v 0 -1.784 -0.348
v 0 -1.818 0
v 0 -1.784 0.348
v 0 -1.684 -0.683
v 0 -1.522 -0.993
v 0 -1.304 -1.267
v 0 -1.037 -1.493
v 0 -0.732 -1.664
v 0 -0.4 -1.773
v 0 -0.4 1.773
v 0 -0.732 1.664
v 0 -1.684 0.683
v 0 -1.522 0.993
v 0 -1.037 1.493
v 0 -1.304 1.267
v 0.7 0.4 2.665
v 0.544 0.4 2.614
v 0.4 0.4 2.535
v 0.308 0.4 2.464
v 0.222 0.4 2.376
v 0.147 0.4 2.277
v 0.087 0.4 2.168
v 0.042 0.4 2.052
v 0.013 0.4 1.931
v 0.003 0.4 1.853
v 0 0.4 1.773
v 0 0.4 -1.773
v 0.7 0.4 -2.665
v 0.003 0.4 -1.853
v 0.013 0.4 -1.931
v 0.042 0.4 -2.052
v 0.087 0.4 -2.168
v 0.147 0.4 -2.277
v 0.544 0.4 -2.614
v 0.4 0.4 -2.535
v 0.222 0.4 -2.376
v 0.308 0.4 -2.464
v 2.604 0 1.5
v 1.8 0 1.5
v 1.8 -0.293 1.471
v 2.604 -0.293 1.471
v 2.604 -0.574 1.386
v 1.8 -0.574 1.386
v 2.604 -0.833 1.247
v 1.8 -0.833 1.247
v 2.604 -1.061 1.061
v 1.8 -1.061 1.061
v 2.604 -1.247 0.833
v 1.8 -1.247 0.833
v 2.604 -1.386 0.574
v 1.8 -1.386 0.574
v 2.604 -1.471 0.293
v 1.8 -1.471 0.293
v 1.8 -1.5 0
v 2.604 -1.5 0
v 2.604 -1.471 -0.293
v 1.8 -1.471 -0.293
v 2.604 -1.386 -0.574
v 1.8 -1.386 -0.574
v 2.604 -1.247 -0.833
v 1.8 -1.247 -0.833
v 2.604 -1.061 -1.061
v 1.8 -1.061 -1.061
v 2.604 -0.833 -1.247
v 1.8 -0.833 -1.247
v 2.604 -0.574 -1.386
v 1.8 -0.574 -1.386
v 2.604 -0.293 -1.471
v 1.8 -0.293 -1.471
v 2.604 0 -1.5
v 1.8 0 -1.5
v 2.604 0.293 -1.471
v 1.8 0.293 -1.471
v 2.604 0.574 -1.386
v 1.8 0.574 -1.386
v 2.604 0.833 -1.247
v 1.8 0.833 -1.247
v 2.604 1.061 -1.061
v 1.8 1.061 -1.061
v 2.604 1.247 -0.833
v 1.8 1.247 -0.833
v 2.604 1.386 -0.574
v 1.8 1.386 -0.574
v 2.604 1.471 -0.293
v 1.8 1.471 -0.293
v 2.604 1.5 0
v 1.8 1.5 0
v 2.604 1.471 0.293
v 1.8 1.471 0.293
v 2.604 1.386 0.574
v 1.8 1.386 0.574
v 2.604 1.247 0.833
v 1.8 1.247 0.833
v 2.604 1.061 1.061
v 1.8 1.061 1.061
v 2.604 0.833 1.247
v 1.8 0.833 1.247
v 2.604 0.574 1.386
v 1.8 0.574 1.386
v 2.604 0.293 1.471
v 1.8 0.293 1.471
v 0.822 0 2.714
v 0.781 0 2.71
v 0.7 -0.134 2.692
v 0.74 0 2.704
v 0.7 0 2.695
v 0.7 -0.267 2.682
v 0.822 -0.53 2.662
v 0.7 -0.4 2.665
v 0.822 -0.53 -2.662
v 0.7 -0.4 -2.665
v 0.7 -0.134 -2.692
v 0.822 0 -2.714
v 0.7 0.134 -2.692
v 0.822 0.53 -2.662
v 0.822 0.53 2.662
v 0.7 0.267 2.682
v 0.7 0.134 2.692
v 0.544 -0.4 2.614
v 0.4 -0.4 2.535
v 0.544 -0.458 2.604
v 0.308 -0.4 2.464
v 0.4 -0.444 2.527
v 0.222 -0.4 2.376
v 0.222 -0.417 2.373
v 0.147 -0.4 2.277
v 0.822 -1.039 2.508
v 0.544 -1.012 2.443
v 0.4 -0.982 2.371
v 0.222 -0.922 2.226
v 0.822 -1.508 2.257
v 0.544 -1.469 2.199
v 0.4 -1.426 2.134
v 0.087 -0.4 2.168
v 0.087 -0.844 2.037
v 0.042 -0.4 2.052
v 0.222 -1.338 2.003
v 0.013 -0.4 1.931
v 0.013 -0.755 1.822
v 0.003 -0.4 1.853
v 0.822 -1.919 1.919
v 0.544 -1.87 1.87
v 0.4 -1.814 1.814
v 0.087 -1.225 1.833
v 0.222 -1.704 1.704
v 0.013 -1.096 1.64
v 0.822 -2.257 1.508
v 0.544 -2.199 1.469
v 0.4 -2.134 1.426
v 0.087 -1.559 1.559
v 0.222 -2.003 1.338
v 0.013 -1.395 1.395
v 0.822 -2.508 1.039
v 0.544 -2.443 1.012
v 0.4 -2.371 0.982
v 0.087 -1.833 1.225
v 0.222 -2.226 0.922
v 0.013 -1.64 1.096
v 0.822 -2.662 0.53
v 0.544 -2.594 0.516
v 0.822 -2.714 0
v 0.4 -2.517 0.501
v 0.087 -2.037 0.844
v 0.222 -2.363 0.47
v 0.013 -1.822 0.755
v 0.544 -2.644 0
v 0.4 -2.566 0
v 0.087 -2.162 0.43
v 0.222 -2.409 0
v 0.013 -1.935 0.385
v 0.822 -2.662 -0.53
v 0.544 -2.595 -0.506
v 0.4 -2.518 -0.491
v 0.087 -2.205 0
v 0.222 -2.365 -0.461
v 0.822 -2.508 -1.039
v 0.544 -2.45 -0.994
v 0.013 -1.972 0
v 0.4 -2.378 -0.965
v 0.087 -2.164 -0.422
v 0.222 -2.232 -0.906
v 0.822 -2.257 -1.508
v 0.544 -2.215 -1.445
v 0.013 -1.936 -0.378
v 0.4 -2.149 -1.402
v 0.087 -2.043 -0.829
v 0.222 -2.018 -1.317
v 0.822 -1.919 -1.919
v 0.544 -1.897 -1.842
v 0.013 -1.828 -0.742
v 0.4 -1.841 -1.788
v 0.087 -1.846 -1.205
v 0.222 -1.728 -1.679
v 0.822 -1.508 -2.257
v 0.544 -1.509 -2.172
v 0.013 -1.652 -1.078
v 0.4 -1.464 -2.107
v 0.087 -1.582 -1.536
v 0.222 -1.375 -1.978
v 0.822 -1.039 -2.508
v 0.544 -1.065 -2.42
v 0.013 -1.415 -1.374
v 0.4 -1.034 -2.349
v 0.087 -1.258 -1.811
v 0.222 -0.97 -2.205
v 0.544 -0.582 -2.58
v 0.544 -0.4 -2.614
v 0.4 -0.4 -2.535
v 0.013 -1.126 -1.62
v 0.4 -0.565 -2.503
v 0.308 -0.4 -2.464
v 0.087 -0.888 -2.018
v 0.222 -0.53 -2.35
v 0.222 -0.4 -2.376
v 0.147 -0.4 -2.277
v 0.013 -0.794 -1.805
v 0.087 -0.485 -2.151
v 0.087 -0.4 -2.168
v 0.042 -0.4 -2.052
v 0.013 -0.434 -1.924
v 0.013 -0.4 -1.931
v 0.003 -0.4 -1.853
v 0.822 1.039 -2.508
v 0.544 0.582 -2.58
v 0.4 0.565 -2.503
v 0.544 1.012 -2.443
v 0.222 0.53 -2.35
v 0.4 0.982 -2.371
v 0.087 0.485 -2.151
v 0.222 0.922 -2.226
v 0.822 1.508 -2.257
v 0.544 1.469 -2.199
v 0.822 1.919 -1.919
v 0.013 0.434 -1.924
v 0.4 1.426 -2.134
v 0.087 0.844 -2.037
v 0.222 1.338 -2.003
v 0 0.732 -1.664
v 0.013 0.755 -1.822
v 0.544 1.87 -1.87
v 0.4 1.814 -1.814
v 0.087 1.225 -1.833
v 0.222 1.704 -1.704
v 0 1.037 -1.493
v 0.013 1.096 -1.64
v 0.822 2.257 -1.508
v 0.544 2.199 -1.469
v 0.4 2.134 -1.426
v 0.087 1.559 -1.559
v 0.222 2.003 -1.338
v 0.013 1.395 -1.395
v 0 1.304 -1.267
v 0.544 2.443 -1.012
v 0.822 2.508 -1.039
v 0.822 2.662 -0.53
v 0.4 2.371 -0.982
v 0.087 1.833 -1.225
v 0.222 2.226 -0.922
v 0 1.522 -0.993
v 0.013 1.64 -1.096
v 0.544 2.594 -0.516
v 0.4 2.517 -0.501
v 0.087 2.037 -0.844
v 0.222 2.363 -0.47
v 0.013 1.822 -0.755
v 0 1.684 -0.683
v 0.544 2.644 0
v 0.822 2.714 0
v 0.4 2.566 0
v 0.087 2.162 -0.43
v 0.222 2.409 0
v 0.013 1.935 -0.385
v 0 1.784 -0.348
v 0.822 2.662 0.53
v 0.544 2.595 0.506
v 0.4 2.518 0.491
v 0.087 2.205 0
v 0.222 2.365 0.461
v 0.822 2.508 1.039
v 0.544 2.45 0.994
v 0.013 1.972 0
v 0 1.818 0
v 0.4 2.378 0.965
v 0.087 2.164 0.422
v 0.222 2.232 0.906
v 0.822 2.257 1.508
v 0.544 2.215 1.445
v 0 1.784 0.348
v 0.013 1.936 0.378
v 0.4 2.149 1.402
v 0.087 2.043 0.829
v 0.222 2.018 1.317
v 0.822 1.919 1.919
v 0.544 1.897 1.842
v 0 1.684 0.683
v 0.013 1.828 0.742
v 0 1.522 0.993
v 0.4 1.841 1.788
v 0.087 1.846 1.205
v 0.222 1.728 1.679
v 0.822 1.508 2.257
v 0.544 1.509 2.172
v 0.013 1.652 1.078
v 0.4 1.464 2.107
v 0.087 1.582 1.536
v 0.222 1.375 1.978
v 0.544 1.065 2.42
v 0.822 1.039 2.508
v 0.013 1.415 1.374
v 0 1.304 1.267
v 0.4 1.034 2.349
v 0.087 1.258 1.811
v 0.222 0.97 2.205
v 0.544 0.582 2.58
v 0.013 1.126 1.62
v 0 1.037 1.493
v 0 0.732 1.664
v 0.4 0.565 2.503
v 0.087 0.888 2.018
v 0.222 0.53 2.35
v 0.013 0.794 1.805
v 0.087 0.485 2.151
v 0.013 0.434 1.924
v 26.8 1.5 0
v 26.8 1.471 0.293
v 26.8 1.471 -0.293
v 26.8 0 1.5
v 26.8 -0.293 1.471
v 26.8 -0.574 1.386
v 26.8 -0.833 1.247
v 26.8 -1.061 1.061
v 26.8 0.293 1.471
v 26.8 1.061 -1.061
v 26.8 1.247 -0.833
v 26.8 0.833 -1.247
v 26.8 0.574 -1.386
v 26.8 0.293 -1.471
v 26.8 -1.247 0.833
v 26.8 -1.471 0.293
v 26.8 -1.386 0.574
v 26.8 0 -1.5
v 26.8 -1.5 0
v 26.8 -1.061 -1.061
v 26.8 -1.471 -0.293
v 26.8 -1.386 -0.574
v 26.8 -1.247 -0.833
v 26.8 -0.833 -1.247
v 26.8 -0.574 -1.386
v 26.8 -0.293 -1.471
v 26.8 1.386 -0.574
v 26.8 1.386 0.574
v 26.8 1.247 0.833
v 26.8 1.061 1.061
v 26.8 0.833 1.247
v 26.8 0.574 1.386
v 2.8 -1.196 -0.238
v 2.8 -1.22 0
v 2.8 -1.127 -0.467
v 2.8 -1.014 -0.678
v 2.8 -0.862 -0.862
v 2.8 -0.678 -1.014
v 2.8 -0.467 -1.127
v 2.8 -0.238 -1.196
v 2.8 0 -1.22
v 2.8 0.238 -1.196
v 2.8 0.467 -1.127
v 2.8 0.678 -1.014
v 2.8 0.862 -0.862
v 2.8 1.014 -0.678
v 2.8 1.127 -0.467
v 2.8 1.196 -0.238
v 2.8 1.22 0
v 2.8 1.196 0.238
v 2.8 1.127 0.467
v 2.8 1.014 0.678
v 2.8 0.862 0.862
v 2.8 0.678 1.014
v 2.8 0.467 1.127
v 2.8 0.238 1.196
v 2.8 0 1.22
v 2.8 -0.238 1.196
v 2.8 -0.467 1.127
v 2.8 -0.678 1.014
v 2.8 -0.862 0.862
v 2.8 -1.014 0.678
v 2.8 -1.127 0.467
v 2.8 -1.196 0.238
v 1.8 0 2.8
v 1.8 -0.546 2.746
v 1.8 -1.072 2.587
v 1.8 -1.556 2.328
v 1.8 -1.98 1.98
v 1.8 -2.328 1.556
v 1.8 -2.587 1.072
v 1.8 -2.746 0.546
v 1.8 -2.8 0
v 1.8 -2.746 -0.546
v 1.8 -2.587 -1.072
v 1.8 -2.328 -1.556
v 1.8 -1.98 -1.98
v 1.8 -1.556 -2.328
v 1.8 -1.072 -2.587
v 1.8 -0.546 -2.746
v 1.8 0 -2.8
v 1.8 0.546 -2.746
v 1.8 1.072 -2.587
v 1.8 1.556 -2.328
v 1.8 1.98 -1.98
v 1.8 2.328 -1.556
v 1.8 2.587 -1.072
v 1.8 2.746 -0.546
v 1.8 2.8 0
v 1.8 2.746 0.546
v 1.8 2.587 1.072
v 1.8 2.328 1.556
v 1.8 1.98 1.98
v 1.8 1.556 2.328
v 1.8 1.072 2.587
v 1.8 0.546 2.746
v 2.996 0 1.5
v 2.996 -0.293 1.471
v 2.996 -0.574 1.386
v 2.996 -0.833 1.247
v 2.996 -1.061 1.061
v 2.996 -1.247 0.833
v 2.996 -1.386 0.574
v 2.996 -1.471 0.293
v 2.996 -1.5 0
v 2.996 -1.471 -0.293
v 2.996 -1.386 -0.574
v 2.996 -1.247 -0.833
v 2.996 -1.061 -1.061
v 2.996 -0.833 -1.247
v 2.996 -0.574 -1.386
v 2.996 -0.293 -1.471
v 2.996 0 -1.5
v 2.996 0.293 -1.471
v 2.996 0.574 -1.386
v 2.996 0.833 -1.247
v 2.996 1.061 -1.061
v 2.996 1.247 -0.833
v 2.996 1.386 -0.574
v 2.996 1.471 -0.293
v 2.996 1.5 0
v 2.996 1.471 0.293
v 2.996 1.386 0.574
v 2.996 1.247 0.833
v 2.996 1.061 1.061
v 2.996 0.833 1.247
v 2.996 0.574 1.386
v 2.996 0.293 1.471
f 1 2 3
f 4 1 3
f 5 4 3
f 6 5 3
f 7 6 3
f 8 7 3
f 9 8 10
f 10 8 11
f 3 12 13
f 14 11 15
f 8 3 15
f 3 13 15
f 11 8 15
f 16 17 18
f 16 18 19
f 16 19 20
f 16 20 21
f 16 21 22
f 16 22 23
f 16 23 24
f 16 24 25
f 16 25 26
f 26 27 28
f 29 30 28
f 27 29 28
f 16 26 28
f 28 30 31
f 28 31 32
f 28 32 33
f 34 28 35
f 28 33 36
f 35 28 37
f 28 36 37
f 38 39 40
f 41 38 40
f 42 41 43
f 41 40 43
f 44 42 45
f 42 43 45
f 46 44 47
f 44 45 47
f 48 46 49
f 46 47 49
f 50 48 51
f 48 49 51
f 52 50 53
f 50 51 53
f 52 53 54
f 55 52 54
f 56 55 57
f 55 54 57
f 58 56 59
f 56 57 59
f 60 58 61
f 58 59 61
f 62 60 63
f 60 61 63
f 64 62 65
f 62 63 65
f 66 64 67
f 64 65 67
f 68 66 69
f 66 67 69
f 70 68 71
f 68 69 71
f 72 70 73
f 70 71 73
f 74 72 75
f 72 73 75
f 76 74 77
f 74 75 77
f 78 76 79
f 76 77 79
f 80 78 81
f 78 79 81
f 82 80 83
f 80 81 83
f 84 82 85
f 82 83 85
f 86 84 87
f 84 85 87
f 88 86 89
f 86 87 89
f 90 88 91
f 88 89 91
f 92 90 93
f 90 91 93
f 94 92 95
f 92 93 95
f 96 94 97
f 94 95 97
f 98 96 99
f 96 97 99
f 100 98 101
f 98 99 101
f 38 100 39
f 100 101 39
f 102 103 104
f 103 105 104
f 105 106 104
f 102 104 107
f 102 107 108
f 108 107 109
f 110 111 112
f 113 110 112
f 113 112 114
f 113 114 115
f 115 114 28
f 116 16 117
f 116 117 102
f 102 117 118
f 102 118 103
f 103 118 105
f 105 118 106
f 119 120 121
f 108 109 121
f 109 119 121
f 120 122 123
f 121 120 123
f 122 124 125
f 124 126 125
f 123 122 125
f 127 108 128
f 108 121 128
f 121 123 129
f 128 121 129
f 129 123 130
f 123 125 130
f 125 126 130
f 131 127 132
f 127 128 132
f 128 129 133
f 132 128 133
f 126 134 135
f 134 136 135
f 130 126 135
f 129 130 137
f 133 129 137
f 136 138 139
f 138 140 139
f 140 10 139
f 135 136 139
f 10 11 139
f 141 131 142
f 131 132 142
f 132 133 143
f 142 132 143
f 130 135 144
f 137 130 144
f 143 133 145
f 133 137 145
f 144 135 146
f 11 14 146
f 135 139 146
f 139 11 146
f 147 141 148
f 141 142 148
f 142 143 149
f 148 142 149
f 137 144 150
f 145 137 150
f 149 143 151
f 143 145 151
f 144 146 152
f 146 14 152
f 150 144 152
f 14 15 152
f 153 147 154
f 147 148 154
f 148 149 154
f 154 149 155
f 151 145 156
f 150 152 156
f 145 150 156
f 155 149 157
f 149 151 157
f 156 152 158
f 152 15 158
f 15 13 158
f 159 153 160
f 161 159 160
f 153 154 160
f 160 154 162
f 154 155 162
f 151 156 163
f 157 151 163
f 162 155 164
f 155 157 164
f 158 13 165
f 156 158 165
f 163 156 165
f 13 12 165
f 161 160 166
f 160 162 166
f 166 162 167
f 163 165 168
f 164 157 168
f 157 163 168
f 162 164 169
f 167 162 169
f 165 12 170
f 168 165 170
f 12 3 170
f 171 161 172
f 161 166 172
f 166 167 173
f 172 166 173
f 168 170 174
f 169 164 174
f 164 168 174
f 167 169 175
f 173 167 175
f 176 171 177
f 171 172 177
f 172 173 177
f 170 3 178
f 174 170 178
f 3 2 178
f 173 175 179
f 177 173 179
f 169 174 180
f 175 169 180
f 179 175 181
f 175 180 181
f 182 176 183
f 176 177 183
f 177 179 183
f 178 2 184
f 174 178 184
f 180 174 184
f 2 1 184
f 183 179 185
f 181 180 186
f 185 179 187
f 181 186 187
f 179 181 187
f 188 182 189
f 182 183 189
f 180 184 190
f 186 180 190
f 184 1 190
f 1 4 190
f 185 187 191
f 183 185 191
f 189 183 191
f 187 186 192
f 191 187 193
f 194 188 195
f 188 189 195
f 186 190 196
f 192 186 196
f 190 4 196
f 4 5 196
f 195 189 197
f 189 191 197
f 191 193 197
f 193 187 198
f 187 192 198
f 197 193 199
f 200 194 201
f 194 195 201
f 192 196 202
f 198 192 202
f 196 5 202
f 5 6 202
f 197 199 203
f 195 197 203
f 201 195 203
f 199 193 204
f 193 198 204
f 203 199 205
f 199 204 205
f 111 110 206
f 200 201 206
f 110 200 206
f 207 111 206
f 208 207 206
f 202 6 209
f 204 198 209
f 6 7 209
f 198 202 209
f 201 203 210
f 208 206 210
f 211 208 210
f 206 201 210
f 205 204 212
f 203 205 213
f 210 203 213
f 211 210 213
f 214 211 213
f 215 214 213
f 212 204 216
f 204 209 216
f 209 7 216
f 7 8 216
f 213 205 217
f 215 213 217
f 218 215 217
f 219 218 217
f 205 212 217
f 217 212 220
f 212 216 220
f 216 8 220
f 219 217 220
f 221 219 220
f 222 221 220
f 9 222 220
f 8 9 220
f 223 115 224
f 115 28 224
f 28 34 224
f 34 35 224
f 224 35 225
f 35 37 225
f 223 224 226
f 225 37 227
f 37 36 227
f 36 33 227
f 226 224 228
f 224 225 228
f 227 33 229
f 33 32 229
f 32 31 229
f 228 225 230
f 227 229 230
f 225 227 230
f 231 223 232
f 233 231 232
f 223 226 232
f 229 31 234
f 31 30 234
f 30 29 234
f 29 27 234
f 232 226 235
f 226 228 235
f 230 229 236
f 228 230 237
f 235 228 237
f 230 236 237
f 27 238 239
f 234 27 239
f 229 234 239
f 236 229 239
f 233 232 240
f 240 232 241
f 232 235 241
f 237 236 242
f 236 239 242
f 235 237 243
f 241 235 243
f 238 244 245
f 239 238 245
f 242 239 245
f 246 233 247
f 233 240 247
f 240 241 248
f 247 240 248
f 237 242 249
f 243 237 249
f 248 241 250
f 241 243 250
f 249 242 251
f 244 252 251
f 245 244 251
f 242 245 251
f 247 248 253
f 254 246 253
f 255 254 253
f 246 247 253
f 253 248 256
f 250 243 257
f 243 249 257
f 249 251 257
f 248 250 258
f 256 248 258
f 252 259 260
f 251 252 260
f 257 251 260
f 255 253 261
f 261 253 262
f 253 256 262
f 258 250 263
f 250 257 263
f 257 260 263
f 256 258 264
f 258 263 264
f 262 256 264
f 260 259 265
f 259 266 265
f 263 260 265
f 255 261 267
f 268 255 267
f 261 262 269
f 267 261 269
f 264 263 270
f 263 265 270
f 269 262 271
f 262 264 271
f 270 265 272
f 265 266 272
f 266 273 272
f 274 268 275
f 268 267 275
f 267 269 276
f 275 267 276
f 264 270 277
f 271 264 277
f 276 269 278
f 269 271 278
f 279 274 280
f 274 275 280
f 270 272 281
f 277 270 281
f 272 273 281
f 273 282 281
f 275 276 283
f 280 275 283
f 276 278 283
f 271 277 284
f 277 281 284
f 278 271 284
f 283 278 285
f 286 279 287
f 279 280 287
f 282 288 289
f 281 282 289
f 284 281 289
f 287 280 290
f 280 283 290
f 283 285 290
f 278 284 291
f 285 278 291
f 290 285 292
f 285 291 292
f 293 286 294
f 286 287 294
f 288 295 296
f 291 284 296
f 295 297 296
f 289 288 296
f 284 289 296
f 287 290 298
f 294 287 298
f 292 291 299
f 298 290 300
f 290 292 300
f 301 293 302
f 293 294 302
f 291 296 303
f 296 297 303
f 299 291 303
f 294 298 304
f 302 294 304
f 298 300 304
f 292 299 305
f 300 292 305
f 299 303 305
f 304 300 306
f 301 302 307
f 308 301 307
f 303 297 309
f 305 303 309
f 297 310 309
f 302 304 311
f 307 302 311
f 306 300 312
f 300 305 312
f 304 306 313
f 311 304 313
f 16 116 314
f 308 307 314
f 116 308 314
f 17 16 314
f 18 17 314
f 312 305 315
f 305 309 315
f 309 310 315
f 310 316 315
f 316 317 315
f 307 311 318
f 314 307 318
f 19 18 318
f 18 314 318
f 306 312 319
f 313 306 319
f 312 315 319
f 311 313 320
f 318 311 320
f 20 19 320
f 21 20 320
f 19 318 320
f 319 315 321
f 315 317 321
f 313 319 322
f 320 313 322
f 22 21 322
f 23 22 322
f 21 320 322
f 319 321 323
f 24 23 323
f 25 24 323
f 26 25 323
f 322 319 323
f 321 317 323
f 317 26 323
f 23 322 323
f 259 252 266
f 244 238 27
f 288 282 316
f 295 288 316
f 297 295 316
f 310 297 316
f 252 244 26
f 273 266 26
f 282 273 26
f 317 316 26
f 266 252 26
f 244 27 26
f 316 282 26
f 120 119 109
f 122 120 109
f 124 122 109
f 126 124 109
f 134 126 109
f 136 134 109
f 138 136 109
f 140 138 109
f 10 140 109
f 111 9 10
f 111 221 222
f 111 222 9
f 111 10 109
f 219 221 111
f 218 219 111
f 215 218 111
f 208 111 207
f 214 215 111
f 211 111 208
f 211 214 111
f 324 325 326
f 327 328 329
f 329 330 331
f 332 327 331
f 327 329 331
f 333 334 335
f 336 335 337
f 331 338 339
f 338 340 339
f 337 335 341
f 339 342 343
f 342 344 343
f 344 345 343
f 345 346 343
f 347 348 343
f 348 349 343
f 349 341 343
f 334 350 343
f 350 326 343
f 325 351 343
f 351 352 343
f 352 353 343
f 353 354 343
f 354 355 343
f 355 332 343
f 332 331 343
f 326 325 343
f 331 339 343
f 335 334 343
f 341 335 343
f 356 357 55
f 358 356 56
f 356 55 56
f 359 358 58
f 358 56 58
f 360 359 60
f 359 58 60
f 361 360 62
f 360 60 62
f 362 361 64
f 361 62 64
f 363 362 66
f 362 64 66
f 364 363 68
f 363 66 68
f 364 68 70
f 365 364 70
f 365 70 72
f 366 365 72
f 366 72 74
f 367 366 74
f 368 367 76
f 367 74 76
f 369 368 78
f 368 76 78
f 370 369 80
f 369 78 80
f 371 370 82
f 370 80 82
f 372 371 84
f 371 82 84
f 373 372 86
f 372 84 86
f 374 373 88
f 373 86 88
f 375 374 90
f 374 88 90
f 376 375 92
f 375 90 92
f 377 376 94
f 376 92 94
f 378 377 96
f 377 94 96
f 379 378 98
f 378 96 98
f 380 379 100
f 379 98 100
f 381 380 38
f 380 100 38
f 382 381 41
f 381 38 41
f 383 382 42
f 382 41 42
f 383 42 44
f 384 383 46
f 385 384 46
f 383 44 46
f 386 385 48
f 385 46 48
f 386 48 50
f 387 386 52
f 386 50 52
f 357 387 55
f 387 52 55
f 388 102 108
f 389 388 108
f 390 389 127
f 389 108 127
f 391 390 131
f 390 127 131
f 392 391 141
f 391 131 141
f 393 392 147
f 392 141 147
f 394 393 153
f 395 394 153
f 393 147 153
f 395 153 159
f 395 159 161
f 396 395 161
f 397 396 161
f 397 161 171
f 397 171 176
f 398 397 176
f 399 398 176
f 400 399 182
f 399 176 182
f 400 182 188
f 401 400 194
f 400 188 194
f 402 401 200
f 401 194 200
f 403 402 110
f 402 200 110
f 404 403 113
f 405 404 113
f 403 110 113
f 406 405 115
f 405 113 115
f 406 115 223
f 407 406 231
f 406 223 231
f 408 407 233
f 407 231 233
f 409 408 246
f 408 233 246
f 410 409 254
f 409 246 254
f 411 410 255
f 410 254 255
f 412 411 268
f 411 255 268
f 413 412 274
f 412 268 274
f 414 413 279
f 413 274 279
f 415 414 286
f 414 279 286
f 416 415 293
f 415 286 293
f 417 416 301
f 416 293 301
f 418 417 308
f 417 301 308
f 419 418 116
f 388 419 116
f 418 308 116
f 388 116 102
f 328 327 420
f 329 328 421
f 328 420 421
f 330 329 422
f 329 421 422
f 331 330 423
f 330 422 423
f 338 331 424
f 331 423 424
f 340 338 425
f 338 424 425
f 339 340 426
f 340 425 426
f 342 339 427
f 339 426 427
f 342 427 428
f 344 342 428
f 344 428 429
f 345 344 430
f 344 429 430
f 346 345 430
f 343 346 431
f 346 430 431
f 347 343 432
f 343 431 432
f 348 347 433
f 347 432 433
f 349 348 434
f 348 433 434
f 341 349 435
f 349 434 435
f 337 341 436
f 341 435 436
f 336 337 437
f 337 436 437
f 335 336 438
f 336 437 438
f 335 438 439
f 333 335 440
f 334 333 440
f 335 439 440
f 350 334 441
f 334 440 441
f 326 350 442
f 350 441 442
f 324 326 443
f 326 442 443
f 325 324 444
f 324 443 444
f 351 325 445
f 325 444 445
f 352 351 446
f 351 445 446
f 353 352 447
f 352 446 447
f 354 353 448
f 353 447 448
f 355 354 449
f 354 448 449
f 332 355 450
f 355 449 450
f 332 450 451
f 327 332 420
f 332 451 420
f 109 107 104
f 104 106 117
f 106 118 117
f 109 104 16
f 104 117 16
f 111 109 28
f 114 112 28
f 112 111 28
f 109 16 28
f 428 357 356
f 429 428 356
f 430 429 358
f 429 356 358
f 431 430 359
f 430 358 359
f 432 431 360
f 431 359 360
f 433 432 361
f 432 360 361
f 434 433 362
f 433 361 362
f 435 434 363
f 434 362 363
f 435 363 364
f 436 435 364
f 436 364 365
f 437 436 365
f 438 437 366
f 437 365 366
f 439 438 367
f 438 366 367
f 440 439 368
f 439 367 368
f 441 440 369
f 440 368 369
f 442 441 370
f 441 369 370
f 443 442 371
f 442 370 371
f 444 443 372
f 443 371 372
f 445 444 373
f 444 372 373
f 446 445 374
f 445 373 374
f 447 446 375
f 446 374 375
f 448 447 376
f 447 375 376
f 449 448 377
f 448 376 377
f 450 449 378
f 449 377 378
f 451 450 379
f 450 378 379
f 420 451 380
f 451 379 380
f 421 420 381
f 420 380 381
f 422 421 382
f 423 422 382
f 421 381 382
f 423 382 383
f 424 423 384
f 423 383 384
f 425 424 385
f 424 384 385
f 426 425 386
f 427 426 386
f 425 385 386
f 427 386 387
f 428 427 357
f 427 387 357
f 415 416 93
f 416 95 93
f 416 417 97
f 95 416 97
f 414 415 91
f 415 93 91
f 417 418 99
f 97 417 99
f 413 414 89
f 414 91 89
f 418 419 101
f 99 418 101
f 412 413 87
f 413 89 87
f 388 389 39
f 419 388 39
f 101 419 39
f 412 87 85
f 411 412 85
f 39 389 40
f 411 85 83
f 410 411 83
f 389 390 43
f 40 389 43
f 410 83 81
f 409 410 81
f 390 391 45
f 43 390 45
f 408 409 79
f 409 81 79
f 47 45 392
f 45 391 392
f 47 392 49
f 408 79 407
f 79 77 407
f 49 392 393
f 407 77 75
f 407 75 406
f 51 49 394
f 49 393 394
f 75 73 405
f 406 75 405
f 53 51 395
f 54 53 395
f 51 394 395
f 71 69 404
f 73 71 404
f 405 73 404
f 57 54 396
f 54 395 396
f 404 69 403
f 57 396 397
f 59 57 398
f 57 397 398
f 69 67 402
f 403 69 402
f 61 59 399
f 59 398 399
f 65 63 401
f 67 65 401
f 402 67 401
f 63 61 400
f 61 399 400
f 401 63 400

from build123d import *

# Parameters (mm, degrees)
FILLET2_R  = 0.9
SKETCH2_W  = 5.6
SKETCH2_H  = 0.8
SLOT_DEPTH = 0.7


with BuildPart() as part:
    # BodySke → Base-Revolve (revolve)
    with BuildSketch(Plane.XY):
        Polygon((1.8, 1.5), (1.8, 2.8), (0, 2.642520406), (0, 0), (26.8, 0), (26.8, 1.5), align=None)
    revolve(axis=Axis((-25.4, 0, 0), (1, 0, 0)))

    # Fillet2
    fillet2_edges = [part.edges().sort_by_distance(p)[0] for p in [
        (0, -2.642520406, 0),
    ]]
    fillet(fillet2_edges, radius=FILLET2_R)

    # Sketch2 → Slot (cut)
    with BuildSketch(Plane(origin=(0, 0, 0), x_dir=(0, 0, -1), z_dir=(1, 0, 0))):
        Rectangle(SKETCH2_W, SKETCH2_H)
    extrude(amount=SLOT_DEPTH, mode=Mode.SUBTRACT)

    # ThdSchSke → ThreadSchematic (revolve, cut)
    with BuildSketch(Plane.XY):
        Polygon((2.8, -1.2195), (2.603591786, -1.5), (2.603591786, -1.875), (2.996408214, -1.875), (2.996408214, -1.5), align=None)
    revolve(axis=Axis((-3.175, 0, 0), (1, 0, 0)), mode=Mode.SUBTRACT)


solid = part.part
